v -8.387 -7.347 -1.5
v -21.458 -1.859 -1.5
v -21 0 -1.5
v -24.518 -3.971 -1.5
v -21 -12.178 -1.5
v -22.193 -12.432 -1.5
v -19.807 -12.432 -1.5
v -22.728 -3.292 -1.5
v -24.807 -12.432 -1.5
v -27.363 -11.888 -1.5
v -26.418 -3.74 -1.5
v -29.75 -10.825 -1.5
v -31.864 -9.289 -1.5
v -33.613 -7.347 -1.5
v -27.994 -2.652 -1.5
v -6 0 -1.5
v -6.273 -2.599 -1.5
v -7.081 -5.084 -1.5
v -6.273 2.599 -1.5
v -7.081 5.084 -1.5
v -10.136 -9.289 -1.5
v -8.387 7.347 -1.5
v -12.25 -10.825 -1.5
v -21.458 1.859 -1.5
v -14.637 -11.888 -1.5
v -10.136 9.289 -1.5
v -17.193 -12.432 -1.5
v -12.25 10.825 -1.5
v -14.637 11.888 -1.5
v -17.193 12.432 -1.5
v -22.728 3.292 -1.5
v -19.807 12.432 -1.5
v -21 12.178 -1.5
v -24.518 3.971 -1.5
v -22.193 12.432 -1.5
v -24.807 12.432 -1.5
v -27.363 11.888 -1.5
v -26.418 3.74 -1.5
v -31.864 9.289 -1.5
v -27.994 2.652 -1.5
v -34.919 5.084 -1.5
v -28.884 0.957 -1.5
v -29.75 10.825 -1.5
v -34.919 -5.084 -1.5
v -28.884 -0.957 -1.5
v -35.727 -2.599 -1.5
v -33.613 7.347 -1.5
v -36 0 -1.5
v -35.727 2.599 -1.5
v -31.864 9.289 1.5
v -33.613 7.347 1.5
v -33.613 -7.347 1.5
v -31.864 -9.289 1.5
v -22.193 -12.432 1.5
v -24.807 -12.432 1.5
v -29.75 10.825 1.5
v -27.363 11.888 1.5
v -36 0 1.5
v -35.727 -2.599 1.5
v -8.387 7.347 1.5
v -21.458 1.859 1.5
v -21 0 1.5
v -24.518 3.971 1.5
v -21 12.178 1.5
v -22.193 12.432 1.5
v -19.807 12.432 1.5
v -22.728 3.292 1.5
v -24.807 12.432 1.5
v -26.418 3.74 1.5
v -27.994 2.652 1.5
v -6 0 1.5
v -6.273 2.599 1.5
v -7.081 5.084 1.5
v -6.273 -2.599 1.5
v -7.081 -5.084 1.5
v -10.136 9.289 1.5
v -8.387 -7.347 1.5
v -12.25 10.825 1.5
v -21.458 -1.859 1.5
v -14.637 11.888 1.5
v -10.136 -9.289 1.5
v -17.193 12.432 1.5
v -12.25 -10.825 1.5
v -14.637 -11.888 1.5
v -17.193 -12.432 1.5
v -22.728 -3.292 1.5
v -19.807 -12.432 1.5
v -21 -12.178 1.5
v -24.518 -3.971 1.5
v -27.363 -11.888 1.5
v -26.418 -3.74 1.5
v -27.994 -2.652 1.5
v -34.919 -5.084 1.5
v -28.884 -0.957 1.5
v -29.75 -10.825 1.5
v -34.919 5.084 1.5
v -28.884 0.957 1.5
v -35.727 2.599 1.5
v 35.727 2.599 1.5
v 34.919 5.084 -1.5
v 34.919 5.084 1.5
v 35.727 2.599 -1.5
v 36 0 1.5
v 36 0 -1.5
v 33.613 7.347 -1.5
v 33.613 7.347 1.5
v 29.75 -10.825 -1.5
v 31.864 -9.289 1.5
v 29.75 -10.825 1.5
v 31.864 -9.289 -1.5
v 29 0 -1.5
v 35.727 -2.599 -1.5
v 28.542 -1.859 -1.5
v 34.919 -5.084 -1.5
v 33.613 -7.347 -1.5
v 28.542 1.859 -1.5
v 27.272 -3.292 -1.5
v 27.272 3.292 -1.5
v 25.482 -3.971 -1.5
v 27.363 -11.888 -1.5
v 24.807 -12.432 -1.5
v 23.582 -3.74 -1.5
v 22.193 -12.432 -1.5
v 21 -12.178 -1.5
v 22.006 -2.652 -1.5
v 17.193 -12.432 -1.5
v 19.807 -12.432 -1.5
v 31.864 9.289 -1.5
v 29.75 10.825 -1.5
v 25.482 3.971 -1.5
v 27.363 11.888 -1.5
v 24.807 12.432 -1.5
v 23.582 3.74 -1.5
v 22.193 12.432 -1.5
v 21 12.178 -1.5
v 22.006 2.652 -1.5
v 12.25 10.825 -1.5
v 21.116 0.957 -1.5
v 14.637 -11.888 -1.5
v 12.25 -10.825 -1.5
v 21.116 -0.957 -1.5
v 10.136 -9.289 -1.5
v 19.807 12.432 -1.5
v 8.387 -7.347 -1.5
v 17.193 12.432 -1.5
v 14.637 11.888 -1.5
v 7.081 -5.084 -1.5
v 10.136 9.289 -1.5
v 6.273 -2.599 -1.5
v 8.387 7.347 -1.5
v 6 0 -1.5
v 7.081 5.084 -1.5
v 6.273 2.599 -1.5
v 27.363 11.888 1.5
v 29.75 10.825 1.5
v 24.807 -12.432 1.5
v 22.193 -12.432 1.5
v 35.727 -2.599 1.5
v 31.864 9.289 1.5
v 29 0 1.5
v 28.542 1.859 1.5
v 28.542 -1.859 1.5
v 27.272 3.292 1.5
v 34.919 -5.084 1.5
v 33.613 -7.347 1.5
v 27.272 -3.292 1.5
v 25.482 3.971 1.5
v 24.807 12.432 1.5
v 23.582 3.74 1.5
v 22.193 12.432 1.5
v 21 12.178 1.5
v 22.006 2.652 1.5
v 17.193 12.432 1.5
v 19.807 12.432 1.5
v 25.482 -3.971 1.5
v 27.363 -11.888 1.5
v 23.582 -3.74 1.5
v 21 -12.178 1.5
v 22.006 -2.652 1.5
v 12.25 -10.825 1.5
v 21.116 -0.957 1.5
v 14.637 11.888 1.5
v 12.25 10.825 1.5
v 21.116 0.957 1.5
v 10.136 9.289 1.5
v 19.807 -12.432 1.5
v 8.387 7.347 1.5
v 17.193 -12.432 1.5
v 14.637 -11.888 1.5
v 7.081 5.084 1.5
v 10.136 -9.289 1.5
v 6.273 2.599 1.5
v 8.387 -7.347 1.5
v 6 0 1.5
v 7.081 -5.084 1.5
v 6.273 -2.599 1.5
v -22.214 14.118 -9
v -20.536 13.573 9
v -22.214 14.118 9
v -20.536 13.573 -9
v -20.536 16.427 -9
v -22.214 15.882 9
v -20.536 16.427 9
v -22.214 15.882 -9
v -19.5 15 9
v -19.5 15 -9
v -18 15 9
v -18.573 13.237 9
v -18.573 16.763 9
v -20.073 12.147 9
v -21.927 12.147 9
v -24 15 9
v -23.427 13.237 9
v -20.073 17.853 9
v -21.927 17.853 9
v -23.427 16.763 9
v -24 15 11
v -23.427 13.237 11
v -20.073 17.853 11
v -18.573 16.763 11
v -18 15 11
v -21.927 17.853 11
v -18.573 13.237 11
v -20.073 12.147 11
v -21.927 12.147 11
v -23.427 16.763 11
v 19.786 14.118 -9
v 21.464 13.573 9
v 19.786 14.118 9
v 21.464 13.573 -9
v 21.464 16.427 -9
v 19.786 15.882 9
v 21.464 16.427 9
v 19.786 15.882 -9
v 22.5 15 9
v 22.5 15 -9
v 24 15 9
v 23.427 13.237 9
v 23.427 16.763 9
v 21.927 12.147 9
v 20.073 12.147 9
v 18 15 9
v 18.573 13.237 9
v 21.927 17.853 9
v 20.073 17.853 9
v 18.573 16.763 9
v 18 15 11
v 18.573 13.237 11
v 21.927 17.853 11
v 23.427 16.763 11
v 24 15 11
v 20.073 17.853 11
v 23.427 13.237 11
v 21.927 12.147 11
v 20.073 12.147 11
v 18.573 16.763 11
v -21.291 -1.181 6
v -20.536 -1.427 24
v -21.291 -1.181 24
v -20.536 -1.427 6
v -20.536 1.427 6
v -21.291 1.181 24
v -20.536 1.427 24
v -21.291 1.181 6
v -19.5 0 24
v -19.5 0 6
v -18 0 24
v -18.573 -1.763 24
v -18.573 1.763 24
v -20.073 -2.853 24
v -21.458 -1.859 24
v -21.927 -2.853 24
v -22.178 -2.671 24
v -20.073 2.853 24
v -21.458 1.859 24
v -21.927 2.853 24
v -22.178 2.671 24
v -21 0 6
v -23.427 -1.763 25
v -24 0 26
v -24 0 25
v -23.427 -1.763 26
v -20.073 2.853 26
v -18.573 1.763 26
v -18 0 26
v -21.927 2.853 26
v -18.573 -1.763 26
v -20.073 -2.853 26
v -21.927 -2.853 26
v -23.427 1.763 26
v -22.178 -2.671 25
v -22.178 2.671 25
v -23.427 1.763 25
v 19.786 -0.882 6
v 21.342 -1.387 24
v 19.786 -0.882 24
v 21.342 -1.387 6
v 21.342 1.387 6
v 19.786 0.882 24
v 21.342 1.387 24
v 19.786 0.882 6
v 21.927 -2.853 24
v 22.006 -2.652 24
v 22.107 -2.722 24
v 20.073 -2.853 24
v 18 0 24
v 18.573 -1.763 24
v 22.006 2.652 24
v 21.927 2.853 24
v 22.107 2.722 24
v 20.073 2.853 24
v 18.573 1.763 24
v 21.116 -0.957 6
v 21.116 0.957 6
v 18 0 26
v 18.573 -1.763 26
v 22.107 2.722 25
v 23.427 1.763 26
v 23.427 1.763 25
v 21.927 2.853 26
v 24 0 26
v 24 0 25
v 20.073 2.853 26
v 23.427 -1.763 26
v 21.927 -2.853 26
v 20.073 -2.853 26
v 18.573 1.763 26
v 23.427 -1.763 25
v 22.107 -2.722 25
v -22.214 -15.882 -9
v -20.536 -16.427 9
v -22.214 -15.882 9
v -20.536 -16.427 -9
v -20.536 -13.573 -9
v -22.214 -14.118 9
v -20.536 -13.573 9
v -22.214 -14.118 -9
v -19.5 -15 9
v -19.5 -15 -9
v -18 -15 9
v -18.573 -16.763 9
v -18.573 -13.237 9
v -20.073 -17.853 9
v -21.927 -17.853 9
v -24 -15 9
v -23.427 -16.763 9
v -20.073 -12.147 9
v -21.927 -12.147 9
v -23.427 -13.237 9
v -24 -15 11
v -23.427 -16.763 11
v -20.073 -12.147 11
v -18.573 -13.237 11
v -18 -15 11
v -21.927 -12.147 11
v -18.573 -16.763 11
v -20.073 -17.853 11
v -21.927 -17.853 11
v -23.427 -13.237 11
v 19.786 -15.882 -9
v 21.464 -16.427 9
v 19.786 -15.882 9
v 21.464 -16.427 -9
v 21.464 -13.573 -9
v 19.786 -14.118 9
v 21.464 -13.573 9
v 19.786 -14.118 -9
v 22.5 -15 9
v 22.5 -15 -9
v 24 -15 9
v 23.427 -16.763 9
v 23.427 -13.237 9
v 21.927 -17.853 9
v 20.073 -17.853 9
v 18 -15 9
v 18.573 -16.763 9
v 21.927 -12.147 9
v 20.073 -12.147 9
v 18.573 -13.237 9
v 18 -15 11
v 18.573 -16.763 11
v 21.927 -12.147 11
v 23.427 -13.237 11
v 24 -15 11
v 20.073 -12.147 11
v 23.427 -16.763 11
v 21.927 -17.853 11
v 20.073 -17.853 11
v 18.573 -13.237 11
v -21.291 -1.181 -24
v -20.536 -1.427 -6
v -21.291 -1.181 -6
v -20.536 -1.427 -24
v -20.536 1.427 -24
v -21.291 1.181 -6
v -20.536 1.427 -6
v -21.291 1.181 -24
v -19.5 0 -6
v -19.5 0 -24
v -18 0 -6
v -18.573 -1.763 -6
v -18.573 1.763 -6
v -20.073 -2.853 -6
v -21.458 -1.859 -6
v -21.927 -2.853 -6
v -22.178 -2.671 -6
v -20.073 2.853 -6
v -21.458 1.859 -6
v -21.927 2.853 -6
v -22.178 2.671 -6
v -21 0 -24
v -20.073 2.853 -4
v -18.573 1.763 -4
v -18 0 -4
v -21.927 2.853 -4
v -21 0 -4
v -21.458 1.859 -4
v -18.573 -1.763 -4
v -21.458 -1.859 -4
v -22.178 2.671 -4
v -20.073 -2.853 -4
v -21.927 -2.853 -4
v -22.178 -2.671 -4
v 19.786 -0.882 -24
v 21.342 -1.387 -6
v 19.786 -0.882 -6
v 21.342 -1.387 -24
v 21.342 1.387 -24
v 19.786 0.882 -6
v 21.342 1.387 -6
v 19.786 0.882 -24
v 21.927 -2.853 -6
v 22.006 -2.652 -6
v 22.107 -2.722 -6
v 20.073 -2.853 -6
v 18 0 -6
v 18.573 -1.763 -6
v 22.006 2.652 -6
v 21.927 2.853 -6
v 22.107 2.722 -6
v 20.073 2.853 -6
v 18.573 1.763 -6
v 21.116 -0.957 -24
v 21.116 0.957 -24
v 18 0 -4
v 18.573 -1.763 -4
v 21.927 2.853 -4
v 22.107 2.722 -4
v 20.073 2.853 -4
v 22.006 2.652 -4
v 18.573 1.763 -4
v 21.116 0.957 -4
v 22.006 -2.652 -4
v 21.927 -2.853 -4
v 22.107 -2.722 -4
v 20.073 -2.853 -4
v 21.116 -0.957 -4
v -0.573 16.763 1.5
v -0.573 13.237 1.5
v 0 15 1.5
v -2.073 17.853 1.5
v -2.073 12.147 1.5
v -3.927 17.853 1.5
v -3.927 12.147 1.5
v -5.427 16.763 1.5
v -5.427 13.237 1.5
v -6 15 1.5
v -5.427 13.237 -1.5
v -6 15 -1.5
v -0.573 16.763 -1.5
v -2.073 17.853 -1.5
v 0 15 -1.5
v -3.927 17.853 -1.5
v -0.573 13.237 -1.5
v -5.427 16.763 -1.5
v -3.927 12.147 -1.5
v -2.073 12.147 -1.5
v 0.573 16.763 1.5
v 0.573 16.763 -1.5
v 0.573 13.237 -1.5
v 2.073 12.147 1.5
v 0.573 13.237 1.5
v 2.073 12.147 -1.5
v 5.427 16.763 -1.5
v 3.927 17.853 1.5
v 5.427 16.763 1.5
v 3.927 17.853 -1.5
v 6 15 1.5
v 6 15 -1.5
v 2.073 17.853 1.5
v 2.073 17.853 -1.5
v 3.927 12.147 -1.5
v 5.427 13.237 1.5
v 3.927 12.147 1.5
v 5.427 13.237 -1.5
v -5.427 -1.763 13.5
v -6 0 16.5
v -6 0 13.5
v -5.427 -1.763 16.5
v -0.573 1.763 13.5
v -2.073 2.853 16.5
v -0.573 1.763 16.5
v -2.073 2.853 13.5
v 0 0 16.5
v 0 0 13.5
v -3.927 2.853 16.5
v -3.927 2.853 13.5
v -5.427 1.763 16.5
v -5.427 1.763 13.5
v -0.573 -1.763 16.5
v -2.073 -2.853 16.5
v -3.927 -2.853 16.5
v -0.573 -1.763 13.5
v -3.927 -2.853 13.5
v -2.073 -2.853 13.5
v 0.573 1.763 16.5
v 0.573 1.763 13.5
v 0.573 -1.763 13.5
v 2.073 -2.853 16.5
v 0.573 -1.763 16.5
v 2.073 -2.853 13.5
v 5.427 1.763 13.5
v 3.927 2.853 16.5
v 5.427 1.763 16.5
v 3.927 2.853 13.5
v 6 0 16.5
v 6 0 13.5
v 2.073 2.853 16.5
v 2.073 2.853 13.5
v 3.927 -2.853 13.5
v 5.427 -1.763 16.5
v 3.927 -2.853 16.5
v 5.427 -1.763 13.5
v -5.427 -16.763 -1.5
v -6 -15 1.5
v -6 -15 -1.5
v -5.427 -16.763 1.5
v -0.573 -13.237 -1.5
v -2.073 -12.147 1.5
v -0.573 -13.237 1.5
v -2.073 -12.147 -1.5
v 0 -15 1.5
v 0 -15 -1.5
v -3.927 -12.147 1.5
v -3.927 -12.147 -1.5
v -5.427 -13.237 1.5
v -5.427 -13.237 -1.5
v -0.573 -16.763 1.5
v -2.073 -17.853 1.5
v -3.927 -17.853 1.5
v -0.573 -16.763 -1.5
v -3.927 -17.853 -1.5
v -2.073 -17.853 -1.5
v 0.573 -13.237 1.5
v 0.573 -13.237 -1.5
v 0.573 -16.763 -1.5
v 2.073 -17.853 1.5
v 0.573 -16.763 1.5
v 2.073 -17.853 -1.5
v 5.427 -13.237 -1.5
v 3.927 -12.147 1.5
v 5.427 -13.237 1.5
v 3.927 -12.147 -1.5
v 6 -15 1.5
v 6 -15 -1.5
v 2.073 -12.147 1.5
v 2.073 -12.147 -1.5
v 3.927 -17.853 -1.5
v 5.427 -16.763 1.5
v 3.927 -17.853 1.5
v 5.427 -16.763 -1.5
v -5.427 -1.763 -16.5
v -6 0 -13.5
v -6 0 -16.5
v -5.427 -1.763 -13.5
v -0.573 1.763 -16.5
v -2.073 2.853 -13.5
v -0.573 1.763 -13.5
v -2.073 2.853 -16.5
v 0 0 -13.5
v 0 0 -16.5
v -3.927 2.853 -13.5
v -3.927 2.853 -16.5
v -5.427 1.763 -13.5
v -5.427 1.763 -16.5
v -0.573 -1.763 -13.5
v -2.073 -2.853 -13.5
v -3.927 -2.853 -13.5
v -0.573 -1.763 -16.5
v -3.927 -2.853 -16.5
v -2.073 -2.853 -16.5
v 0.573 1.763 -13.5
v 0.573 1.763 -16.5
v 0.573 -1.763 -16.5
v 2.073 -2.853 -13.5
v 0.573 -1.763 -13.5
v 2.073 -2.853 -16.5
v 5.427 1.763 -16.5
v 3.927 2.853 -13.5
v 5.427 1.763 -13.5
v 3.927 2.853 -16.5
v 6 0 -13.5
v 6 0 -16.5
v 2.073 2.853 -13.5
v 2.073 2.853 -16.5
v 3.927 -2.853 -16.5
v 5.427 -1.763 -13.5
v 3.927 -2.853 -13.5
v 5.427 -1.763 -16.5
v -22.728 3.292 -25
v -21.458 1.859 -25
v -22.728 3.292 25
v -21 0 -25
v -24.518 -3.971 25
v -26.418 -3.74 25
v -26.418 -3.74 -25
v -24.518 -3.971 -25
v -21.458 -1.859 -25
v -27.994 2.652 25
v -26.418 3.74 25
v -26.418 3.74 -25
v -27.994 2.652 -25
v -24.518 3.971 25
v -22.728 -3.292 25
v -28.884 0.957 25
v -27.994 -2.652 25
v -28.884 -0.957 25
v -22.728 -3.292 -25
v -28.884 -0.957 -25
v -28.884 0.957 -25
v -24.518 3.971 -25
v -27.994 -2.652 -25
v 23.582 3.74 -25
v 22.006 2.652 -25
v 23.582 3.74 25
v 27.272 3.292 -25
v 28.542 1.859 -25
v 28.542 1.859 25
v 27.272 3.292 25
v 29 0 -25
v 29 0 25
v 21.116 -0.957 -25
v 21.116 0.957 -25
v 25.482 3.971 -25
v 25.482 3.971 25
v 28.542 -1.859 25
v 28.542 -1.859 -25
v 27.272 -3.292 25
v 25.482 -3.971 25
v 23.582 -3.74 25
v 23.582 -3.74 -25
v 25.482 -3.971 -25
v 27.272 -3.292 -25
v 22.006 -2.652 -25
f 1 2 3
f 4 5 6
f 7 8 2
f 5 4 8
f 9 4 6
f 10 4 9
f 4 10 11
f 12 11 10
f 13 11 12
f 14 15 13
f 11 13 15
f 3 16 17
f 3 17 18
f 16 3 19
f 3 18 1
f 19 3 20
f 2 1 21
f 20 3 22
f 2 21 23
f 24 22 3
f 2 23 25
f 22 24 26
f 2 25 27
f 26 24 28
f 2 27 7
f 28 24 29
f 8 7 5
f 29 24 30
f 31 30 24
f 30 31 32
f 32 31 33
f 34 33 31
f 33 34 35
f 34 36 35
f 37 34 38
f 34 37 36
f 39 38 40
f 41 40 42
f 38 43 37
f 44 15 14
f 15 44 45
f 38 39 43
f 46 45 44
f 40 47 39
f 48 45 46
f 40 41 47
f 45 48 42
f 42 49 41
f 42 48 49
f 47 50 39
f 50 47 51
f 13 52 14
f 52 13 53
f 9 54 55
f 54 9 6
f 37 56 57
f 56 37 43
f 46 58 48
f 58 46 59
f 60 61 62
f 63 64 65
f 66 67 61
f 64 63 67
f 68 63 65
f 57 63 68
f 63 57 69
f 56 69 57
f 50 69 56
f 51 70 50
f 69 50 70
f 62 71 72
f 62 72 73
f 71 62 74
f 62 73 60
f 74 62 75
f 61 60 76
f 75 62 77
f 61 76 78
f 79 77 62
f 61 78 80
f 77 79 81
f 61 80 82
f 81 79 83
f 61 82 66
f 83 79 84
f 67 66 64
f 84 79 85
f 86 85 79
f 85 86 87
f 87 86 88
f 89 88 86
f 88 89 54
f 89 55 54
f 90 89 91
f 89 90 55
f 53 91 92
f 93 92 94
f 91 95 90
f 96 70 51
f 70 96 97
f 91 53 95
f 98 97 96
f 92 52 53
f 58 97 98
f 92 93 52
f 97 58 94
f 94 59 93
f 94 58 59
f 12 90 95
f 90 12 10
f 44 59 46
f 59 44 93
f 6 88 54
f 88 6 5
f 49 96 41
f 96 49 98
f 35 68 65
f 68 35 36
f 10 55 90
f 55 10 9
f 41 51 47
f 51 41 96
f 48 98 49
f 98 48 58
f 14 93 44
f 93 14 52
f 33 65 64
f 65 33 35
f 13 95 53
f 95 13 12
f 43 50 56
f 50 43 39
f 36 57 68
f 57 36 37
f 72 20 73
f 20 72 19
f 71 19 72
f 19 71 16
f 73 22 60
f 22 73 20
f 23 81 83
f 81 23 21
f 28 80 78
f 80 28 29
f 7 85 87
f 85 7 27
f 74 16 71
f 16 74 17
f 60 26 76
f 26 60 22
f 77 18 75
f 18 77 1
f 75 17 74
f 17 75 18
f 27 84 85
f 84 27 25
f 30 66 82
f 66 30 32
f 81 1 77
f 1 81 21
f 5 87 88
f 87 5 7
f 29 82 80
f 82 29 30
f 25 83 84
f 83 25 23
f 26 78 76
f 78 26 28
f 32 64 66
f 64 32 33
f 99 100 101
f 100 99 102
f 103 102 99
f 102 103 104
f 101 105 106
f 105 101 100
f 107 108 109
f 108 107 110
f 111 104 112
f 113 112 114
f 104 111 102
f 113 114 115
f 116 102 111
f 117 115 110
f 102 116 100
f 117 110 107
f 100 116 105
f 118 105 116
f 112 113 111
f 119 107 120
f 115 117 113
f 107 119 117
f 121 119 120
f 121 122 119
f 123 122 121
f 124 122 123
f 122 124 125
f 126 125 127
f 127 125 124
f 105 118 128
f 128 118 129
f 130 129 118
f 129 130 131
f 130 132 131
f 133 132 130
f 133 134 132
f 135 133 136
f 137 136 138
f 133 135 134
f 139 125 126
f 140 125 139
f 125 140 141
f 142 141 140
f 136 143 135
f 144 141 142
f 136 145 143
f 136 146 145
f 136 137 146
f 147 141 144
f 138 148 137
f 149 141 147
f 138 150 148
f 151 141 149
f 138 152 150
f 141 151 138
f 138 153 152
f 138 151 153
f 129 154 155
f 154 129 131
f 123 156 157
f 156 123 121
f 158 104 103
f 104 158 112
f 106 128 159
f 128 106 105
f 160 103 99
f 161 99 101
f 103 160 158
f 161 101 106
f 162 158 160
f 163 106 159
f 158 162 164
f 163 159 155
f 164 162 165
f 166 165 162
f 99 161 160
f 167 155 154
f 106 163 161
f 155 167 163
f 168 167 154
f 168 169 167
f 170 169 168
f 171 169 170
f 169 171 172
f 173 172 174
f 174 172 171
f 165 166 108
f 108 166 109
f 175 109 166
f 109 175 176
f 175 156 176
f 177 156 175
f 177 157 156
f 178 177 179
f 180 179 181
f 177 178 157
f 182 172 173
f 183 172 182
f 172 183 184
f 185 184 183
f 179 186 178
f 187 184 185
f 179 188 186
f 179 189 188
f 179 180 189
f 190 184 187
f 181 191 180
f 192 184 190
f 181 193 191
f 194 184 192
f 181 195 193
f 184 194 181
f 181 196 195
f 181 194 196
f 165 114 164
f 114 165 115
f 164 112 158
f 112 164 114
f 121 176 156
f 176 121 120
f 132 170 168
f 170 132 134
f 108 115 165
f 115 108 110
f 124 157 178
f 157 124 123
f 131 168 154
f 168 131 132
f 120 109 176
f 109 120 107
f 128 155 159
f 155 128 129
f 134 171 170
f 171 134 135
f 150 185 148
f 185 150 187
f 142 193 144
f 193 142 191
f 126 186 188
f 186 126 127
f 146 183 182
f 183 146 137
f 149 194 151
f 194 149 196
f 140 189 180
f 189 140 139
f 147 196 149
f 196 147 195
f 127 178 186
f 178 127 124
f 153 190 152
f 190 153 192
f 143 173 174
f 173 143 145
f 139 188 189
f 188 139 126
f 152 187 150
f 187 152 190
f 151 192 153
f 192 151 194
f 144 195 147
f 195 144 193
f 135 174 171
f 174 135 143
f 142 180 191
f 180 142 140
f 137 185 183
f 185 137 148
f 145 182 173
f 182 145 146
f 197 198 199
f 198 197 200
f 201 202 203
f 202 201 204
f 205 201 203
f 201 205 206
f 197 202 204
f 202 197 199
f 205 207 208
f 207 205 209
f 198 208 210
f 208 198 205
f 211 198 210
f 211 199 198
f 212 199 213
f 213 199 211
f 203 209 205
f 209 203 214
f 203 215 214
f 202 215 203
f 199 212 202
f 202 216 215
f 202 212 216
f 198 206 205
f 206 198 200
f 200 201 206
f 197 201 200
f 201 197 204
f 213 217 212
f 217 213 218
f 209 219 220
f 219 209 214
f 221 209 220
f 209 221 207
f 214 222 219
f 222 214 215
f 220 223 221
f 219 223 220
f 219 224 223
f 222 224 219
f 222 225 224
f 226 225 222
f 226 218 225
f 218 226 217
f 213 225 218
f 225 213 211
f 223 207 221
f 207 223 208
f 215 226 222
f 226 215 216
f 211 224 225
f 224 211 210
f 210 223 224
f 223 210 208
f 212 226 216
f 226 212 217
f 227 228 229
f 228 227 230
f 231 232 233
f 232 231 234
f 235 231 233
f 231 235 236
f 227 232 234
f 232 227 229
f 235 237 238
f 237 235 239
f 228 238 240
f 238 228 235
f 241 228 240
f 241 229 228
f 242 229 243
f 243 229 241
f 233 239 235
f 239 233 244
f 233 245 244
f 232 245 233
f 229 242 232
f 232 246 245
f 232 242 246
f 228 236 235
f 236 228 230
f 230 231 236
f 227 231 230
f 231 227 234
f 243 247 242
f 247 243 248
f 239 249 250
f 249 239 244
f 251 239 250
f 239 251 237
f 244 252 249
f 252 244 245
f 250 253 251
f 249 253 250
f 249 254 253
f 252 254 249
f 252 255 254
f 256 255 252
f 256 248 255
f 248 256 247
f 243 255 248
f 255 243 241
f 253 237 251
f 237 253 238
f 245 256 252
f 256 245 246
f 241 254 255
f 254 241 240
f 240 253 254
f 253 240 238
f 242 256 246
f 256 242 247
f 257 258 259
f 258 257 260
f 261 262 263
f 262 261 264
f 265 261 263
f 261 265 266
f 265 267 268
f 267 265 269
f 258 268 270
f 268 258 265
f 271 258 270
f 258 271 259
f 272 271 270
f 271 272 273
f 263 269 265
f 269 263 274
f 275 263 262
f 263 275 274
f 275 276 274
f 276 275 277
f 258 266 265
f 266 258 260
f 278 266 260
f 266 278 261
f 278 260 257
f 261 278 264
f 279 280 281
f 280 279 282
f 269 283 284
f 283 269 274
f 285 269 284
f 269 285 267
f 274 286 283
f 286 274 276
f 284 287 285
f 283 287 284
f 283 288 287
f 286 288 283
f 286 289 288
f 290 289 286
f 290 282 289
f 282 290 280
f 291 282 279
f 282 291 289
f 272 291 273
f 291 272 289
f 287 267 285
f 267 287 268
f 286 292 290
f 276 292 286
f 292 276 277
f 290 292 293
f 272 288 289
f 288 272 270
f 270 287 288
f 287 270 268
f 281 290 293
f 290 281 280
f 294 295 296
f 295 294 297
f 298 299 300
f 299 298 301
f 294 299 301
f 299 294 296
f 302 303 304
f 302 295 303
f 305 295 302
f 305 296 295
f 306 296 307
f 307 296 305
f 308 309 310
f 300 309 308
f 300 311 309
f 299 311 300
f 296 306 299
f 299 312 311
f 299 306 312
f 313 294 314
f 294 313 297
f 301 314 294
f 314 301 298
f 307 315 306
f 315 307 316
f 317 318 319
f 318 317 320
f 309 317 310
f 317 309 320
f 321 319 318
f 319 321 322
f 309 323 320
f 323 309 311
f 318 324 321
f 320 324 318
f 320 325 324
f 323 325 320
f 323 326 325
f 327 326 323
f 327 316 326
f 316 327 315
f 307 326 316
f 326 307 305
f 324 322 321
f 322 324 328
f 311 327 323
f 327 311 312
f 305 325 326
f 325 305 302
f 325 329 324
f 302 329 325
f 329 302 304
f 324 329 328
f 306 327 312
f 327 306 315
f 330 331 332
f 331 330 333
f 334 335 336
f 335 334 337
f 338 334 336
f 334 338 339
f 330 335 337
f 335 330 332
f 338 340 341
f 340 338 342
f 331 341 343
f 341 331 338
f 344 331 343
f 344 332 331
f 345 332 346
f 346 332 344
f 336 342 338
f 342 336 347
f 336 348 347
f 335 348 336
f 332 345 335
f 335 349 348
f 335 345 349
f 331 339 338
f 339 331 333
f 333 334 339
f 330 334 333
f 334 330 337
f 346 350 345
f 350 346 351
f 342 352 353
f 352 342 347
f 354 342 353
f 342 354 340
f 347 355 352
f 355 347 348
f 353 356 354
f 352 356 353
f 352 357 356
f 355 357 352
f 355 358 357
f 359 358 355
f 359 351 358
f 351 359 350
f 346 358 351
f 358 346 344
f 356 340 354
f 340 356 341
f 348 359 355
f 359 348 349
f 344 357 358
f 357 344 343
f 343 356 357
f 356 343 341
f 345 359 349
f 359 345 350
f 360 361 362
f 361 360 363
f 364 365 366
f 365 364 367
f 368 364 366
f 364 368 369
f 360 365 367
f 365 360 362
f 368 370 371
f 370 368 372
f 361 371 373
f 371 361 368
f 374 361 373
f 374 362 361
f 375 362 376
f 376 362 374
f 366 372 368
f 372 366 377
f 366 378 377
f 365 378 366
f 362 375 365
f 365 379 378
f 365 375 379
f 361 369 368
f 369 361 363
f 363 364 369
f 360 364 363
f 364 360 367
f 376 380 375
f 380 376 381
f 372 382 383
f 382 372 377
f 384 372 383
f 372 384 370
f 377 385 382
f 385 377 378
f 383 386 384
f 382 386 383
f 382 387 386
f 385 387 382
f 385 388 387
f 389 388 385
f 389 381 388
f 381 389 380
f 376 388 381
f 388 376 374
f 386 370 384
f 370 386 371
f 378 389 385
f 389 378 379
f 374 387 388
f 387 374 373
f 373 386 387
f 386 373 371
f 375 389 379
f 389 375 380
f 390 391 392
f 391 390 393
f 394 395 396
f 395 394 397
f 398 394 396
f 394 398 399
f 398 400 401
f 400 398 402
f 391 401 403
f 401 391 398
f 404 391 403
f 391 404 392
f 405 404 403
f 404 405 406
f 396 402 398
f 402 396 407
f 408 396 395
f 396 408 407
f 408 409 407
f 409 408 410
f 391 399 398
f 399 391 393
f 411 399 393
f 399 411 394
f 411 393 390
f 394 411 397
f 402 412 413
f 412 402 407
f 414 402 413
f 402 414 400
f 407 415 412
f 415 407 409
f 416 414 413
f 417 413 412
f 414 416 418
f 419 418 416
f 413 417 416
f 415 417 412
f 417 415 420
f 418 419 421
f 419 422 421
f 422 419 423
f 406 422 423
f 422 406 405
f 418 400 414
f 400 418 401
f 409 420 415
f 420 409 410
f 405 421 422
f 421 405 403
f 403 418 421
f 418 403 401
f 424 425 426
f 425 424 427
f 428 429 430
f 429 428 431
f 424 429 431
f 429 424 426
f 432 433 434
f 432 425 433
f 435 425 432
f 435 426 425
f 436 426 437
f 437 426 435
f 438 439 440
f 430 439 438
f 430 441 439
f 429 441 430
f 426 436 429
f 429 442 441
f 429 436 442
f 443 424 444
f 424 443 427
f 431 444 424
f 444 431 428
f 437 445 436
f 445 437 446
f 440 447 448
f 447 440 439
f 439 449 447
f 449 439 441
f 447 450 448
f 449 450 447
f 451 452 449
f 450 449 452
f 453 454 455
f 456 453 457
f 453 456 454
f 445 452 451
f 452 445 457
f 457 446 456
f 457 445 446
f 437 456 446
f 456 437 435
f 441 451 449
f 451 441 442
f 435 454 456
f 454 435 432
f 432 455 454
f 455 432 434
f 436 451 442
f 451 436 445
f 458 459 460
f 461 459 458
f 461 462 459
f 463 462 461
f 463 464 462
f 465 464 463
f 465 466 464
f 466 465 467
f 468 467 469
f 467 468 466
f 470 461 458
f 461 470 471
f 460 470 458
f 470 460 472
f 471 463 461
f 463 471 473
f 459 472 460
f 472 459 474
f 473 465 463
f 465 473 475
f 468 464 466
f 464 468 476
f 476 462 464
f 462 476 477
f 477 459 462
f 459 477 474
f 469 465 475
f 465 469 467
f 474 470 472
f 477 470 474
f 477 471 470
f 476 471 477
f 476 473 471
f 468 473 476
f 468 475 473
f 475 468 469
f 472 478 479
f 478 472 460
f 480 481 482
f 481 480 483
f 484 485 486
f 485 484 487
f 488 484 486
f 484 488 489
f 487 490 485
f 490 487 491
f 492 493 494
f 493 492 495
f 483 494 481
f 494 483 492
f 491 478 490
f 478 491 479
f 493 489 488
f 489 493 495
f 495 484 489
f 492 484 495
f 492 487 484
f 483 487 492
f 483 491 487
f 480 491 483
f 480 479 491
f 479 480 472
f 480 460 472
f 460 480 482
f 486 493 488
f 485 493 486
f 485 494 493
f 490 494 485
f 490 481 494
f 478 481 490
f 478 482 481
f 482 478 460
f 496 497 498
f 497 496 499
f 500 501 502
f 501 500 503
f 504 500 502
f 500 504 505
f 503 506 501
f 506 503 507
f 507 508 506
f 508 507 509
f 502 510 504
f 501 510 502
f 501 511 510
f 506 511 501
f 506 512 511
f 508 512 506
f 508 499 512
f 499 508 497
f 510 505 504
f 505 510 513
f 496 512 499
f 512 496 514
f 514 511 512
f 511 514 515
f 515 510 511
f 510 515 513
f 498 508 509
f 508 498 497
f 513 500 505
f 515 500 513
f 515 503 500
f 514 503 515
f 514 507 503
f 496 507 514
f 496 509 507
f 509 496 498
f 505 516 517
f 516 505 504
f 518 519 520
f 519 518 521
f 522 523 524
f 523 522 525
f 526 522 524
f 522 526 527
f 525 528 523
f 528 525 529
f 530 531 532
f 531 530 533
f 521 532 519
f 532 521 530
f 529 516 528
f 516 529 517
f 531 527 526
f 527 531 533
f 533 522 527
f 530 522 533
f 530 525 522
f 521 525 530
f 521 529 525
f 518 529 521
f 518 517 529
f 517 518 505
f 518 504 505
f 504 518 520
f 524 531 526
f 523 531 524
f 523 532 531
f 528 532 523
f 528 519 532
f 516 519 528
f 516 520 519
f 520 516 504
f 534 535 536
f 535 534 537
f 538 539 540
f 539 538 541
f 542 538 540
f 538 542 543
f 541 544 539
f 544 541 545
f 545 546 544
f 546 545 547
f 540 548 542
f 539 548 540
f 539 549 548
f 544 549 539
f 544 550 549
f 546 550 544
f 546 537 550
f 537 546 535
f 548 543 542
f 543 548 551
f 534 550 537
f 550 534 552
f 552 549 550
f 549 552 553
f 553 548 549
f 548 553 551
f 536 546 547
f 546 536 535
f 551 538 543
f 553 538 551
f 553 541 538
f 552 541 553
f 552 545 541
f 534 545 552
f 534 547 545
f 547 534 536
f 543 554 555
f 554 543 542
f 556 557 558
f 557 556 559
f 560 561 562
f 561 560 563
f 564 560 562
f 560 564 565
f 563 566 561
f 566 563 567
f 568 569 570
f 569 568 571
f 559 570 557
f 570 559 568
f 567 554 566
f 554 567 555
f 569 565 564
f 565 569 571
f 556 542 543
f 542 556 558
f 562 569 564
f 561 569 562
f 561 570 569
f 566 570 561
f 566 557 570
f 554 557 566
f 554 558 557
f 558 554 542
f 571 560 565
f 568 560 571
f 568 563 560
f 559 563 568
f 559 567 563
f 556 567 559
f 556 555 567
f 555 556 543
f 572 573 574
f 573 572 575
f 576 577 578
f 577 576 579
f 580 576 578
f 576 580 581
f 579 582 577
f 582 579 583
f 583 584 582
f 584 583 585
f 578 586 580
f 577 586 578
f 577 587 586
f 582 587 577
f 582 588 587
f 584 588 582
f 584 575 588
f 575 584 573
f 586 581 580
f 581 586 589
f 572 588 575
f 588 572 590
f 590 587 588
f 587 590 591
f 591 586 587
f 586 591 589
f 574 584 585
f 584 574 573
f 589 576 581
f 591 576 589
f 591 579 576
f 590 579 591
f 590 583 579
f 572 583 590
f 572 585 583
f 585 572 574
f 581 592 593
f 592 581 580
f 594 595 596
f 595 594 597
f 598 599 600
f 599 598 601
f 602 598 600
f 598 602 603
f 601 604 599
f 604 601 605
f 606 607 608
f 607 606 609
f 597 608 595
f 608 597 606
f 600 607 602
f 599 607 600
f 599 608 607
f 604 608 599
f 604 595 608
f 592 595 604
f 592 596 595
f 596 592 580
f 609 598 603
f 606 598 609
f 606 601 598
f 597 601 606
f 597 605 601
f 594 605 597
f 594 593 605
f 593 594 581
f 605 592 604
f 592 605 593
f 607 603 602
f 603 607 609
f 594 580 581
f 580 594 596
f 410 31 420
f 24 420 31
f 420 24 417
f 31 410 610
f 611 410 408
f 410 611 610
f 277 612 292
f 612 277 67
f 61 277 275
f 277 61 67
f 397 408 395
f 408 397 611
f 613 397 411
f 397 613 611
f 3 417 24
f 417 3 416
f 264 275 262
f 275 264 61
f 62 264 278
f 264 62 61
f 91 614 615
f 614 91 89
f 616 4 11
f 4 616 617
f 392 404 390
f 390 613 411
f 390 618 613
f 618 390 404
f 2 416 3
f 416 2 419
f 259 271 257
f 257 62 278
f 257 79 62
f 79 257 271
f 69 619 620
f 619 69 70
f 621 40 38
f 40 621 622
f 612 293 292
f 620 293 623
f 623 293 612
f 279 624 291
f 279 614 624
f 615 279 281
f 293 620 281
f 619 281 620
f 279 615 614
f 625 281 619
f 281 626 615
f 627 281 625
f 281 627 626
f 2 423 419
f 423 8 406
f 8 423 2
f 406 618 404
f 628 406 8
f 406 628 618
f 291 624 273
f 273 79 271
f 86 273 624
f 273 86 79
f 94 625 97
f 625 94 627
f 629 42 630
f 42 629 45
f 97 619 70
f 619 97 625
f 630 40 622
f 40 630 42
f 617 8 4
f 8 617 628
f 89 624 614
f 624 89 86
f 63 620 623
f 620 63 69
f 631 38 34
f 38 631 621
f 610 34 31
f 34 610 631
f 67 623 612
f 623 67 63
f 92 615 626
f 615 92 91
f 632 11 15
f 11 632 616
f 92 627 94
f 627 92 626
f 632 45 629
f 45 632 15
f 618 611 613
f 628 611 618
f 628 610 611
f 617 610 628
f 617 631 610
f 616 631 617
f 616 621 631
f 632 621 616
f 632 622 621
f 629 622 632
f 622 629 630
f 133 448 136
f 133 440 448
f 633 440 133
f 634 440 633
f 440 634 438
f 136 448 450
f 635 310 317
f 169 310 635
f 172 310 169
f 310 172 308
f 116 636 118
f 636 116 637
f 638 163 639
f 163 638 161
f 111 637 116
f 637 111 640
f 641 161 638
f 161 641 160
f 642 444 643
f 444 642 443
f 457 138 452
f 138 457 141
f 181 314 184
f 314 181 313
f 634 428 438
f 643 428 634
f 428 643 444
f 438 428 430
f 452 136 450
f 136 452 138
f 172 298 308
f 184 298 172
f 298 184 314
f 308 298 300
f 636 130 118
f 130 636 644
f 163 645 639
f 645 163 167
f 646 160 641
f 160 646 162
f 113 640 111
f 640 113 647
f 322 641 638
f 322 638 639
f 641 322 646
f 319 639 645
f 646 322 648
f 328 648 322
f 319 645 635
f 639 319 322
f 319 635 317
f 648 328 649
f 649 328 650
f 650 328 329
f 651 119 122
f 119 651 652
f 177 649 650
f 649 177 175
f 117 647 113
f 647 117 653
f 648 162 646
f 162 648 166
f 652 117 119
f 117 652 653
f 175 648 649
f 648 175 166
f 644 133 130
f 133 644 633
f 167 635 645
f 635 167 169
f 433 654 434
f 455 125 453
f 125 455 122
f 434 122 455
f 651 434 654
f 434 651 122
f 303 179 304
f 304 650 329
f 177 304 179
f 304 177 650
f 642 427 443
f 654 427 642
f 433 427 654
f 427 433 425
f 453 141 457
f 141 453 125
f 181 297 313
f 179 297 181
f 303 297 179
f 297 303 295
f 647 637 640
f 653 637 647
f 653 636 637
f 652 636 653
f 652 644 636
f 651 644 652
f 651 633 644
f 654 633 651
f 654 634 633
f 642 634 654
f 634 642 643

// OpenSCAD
// Parameters
shaft_diameter = 8; // Reduced diameter for better proportion
shaft_length = 50; // Increased length to match original model
flange_diameter = 25;
flange_thickness = 3; // Reduced thickness for better definition
spacer_diameter = 20;
spacer_thickness = 2; // Adjusted for better separation
bolt_diameter = 3;
bolt_length = 18; // Extended bolts for better visibility
nut_diameter = 6;
nut_thickness = 3;
hole_spacing = 15;
num_bolts = 4;

// Function to create a shaft
module shaft(length) {
    cylinder(h=length, d=shaft_diameter, center=true);
}

// Function to create a flange plate
module flange_plate() {
    difference() {
        cylinder(h=flange_thickness, d=flange_diameter, center=true);
        for (i = [0:num_bolts-1]) {
            angle = i * 360 / num_bolts;
            translate([hole_spacing * cos(angle), hole_spacing * sin(angle), 0])
                cylinder(h=flange_thickness+2, d=bolt_diameter, center=true);
        }
    }
}

// Function to create a spacer ring
module spacer_ring() {
    difference() {
        cylinder(h=spacer_thickness, d=spacer_diameter, center=true);
        for (i = [0:num_bolts-1]) {
            angle = i * 360 / num_bolts;
            translate([hole_spacing * cos(angle), hole_spacing * sin(angle), 0])
                cylinder(h=spacer_thickness+2, d=bolt_diameter, center=true);
        }
    }
}

// Function to create a bolt with a hexagonal head
module bolt() {
    translate([0, 0, -bolt_length/2])
        cylinder(h=bolt_length, d=bolt_diameter, center=false);
    translate([0, 0, bolt_length/2])
        cylinder(h=2, d1=6, d2=6, center=false); // Hexagonal head
}

// Function to create a nut
module nut() {
    cylinder(h=nut_thickness, d=nut_diameter, center=true);
}

// Assembly
module flexible_coupling() {
    translate([-shaft_length/2, 0, 0]) shaft(shaft_length);
    translate([shaft_length/2, 0, 0]) shaft(shaft_length);
    
    translate([-shaft_length/2 + flange_thickness/2, 0, 0]) flange_plate();
    translate([-shaft_length/2 + flange_thickness + spacer_thickness/2, 0, 0]) spacer_ring();
    translate([-shaft_length/2 + flange_thickness + spacer_thickness + flange_thickness/2, 0, 0]) flange_plate();
    
    translate([shaft_length/2 - flange_thickness/2, 0, 0]) flange_plate();
    translate([shaft_length/2 - flange_thickness - spacer_thickness/2, 0, 0]) spacer_ring();
    translate([shaft_length/2 - flange_thickness - spacer_thickness - flange_thickness/2, 0, 0]) flange_plate();
    
    for (i = [0:num_bolts-1]) {
        angle = i * 360 / num_bolts;
        translate([-shaft_length/2 + flange_thickness + spacer_thickness/2, hole_spacing * cos(angle), hole_spacing * sin(angle)])
            bolt();
        translate([shaft_length/2 - flange_thickness - spacer_thickness/2, hole_spacing * cos(angle), hole_spacing * sin(angle)])
            bolt();
    }
    
    for (i = [0:num_bolts-1]) {
        angle = i * 360 / num_bolts;
        translate([-shaft_length/2 + flange_thickness + spacer_thickness/2 + bolt_length, hole_spacing * cos(angle), hole_spacing * sin(angle)])
            nut();
        translate([shaft_length/2 - flange_thickness - spacer_thickness/2 - bolt_length, hole_spacing * cos(angle), hole_spacing * sin(angle)])
            nut();
    }
}

// Render the model
flexible_coupling();
